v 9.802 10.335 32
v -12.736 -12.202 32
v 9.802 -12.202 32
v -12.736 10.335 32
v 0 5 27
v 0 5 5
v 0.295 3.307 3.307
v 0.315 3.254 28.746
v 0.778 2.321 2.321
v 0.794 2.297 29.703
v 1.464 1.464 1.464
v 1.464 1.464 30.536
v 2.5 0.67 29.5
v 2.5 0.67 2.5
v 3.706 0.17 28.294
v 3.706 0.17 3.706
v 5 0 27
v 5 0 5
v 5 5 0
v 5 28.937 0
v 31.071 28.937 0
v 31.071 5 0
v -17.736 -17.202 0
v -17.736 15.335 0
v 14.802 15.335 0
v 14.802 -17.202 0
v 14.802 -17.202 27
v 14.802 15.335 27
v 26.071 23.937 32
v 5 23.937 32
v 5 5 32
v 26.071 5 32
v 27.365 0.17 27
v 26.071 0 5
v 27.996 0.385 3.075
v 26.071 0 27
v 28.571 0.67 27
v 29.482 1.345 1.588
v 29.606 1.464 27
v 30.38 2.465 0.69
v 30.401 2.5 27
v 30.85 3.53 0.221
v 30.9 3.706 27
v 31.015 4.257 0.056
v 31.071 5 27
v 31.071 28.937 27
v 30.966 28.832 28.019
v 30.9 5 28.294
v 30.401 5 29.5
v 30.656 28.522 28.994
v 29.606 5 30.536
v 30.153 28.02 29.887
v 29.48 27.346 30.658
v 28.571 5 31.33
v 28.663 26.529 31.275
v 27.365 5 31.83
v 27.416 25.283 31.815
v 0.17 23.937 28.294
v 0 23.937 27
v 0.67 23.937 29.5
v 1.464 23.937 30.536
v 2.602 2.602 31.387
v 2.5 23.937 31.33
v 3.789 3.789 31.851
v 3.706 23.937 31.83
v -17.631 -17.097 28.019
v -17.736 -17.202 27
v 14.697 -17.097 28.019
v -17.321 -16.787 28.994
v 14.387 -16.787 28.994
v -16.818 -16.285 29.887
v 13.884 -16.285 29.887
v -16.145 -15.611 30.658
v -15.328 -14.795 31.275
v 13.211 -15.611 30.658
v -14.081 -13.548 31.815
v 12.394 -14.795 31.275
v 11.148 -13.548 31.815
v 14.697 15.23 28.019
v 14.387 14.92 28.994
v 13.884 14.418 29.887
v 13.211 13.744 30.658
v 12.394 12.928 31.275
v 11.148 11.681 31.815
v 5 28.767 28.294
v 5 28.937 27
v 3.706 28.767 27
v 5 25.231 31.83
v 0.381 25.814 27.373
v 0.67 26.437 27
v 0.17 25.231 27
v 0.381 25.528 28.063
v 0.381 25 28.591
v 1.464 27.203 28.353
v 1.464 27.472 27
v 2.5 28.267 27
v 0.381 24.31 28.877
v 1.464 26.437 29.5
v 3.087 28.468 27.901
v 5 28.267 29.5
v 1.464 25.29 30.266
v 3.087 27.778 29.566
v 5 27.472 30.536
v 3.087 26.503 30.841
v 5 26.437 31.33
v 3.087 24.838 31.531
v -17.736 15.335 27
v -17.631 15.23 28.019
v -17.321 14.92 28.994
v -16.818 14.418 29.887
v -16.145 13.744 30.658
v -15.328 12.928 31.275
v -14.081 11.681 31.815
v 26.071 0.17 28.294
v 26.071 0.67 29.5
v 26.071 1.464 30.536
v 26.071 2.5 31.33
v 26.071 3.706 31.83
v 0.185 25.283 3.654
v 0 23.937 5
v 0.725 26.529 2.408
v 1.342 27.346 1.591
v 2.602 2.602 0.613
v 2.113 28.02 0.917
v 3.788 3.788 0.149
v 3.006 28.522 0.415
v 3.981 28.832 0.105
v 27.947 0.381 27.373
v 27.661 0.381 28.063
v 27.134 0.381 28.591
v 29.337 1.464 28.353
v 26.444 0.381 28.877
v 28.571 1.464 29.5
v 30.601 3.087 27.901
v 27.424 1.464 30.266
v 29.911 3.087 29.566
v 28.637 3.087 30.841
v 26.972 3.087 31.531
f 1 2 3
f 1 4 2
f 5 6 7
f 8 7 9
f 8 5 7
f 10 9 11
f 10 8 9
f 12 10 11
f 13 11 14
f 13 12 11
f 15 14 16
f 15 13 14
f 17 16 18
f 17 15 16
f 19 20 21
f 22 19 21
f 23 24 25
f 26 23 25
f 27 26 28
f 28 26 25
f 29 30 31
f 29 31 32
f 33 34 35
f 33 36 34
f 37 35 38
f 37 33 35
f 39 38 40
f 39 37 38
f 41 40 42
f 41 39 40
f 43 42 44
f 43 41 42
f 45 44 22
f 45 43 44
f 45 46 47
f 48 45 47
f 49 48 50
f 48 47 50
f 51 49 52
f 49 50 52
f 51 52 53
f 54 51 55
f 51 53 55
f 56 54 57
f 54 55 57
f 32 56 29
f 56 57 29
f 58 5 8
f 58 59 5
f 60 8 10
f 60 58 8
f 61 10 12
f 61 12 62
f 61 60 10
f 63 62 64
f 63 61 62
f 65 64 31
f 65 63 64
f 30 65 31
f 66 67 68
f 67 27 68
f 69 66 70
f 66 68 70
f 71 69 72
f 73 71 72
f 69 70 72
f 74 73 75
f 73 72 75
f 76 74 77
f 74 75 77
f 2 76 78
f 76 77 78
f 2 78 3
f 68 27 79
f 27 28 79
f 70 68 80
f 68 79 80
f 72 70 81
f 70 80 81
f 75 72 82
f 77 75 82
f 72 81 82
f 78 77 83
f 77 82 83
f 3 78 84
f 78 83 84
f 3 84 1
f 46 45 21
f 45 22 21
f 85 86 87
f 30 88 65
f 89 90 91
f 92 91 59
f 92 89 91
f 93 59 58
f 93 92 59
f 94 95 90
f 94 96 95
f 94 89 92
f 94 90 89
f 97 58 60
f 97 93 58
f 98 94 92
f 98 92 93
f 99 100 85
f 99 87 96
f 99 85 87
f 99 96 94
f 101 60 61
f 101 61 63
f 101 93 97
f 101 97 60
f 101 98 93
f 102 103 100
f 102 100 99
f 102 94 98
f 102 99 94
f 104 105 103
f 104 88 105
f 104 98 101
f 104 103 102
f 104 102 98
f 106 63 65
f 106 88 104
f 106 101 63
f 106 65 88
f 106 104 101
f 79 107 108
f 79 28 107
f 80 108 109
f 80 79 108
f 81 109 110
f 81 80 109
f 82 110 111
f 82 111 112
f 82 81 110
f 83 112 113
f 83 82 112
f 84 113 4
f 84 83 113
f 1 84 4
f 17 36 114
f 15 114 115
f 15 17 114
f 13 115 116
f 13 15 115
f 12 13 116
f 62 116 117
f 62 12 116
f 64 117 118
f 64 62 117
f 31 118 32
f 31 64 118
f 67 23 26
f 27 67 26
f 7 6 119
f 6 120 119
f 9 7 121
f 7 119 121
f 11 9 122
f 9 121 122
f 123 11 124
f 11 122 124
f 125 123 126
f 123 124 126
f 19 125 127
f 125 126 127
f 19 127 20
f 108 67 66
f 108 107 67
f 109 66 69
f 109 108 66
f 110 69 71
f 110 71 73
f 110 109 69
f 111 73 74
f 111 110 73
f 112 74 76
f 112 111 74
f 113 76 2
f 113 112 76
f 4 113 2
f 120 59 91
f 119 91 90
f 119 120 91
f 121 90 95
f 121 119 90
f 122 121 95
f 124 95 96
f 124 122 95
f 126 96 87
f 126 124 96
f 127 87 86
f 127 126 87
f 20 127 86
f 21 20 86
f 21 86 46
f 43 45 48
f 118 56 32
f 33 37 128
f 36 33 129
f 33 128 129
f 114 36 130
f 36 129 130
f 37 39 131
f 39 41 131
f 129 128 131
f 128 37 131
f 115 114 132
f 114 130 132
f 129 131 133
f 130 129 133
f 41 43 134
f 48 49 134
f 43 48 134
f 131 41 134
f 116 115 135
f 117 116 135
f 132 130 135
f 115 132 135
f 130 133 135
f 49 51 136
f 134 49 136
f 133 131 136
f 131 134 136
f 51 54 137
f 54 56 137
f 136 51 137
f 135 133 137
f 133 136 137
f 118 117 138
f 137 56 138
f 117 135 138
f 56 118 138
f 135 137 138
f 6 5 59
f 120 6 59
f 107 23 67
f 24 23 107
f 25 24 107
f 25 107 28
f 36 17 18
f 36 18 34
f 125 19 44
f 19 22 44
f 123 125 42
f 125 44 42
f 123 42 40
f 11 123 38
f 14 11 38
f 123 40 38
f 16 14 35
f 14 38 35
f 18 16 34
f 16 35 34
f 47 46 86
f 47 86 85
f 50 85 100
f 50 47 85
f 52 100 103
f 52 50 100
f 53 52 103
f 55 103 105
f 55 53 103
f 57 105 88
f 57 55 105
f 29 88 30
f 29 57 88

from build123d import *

# Parameters (mm, degrees)
F1_W        = 32.5374016538
F1_H        = 32.5373997912
F2_DEPTH    = 32
F0_W        = 31.0705509037
F0_H        = 28.9369504899
F3_R        = 5
F4_R        = 5
F5_T1_DEPTH = 48.9369504899
F5_T3_DEPTH = 39.5
F5_T5_DEPTH = 31.4369504899
F5_T8_ANGLE = 90
F6_R        = 5


# Not quite as in the source:
# - a fillet or chamfer that OpenCascade refuses, or shapes differently, is made with other operations: its cross-section is extruded or revolved along the edge and cut away or added


with BuildPart() as f2:
    # F1 (on Top) → F2 (new body)
    with BuildSketch(Plane.XY):
        with Locations((-1.4668493532, -0.933450181)):
            Rectangle(F1_W, F1_H)
    extrude(amount=F2_DEPTH)

    # F6
    f6_edges = [f2.edges().sort_by_distance(p)[0] for p in [
        (-1.466849, -17.20215, 32),
        (-17.73555, -0.93345, 32),
        (-1.466849, 15.33525, 32),
        (14.801851, -0.93345, 32),
    ]]
    fillet(f6_edges, radius=F6_R)


with BuildPart() as f2b:
    # F0 (on Top) → F2, piece 2 (new body)
    with BuildSketch(Plane.XY):
        with Locations((15.5352754518, 14.4684752449)):
            Rectangle(F0_W, F0_H)
    extrude(amount=F2_DEPTH)

    # F3
    f3_edges = [f2b.edges().sort_by_distance(p)[0] for p in [
        (15.535275, 28.93695, 32),
        (31.070551, 14.468475, 32),
    ]]
    fillet(f3_edges, radius=F3_R)

    # F4
    f4_edges = [f2b.edges().sort_by_distance(p)[0] for p in [
        (31.070551, 0, 13.5),
        (29.606085, 0, 30.535534),
        (15.535275, 0, 0),
        (13.035275, 0, 32),
        (0, 0, 16),
    ]]
    fillet(f4_edges, radius=F4_R)

    # F5: fillet of radius 5 on 5 edges, made by hand

    # F5_s2 → F5_t1 (cut)
    with BuildSketch(Plane.XZ.offset(-41.4369504899)):
        with BuildLine():
            ThreePointArc((0, 5), (1.4644660941, 1.4644660941), (5, 0))
            Line((5, 0), (0, 0))
            Line((0, 0), (0, 5))
        make_face()
    extrude(amount=F5_T1_DEPTH, mode=Mode.SUBTRACT)

    # F5_s4 → F5_t3 (cut)
    with BuildSketch(Plane.XY.offset(-12.5)):
        with BuildLine():
            ThreePointArc((0, 23.9369504899), (1.4644660941, 27.4724843958), (5, 28.9369504899))
            Line((5, 28.9369504899), (0, 28.9369504899))
            Line((0, 28.9369504899), (0, 23.9369504899))
        make_face()
    extrude(amount=F5_T3_DEPTH, mode=Mode.SUBTRACT)

    # F5_s6 → F5_t5 (cut)
    with BuildSketch(Plane.XZ.offset(-23.9369504899)):
        with BuildLine():
            ThreePointArc((0, 27), (1.4644660941, 30.5355339059), (5, 32))
            Line((5, 32), (0, 32))
            Line((0, 32), (0, 27))
        make_face()
    extrude(amount=F5_T5_DEPTH, mode=Mode.SUBTRACT)

    # F5_s7 → F5_t8 (revolve, cut)
    with BuildSketch(Plane.XY.offset(27)):
        with BuildLine():
            ThreePointArc((0, 23.9369504899), (1.4644660941, 27.4724843958), (5, 28.9369504899))
            Line((5, 28.9369504899), (0, 28.9369504899))
            Line((0, 28.9369504899), (0, 23.9369504899))
        make_face()
    revolve(axis=Axis((0, 23.9369504899, 27), (1, 0, 0)), revolution_arc=F5_T8_ANGLE, mode=Mode.SUBTRACT)


solid = Compound([f2.part, f2b.part])
